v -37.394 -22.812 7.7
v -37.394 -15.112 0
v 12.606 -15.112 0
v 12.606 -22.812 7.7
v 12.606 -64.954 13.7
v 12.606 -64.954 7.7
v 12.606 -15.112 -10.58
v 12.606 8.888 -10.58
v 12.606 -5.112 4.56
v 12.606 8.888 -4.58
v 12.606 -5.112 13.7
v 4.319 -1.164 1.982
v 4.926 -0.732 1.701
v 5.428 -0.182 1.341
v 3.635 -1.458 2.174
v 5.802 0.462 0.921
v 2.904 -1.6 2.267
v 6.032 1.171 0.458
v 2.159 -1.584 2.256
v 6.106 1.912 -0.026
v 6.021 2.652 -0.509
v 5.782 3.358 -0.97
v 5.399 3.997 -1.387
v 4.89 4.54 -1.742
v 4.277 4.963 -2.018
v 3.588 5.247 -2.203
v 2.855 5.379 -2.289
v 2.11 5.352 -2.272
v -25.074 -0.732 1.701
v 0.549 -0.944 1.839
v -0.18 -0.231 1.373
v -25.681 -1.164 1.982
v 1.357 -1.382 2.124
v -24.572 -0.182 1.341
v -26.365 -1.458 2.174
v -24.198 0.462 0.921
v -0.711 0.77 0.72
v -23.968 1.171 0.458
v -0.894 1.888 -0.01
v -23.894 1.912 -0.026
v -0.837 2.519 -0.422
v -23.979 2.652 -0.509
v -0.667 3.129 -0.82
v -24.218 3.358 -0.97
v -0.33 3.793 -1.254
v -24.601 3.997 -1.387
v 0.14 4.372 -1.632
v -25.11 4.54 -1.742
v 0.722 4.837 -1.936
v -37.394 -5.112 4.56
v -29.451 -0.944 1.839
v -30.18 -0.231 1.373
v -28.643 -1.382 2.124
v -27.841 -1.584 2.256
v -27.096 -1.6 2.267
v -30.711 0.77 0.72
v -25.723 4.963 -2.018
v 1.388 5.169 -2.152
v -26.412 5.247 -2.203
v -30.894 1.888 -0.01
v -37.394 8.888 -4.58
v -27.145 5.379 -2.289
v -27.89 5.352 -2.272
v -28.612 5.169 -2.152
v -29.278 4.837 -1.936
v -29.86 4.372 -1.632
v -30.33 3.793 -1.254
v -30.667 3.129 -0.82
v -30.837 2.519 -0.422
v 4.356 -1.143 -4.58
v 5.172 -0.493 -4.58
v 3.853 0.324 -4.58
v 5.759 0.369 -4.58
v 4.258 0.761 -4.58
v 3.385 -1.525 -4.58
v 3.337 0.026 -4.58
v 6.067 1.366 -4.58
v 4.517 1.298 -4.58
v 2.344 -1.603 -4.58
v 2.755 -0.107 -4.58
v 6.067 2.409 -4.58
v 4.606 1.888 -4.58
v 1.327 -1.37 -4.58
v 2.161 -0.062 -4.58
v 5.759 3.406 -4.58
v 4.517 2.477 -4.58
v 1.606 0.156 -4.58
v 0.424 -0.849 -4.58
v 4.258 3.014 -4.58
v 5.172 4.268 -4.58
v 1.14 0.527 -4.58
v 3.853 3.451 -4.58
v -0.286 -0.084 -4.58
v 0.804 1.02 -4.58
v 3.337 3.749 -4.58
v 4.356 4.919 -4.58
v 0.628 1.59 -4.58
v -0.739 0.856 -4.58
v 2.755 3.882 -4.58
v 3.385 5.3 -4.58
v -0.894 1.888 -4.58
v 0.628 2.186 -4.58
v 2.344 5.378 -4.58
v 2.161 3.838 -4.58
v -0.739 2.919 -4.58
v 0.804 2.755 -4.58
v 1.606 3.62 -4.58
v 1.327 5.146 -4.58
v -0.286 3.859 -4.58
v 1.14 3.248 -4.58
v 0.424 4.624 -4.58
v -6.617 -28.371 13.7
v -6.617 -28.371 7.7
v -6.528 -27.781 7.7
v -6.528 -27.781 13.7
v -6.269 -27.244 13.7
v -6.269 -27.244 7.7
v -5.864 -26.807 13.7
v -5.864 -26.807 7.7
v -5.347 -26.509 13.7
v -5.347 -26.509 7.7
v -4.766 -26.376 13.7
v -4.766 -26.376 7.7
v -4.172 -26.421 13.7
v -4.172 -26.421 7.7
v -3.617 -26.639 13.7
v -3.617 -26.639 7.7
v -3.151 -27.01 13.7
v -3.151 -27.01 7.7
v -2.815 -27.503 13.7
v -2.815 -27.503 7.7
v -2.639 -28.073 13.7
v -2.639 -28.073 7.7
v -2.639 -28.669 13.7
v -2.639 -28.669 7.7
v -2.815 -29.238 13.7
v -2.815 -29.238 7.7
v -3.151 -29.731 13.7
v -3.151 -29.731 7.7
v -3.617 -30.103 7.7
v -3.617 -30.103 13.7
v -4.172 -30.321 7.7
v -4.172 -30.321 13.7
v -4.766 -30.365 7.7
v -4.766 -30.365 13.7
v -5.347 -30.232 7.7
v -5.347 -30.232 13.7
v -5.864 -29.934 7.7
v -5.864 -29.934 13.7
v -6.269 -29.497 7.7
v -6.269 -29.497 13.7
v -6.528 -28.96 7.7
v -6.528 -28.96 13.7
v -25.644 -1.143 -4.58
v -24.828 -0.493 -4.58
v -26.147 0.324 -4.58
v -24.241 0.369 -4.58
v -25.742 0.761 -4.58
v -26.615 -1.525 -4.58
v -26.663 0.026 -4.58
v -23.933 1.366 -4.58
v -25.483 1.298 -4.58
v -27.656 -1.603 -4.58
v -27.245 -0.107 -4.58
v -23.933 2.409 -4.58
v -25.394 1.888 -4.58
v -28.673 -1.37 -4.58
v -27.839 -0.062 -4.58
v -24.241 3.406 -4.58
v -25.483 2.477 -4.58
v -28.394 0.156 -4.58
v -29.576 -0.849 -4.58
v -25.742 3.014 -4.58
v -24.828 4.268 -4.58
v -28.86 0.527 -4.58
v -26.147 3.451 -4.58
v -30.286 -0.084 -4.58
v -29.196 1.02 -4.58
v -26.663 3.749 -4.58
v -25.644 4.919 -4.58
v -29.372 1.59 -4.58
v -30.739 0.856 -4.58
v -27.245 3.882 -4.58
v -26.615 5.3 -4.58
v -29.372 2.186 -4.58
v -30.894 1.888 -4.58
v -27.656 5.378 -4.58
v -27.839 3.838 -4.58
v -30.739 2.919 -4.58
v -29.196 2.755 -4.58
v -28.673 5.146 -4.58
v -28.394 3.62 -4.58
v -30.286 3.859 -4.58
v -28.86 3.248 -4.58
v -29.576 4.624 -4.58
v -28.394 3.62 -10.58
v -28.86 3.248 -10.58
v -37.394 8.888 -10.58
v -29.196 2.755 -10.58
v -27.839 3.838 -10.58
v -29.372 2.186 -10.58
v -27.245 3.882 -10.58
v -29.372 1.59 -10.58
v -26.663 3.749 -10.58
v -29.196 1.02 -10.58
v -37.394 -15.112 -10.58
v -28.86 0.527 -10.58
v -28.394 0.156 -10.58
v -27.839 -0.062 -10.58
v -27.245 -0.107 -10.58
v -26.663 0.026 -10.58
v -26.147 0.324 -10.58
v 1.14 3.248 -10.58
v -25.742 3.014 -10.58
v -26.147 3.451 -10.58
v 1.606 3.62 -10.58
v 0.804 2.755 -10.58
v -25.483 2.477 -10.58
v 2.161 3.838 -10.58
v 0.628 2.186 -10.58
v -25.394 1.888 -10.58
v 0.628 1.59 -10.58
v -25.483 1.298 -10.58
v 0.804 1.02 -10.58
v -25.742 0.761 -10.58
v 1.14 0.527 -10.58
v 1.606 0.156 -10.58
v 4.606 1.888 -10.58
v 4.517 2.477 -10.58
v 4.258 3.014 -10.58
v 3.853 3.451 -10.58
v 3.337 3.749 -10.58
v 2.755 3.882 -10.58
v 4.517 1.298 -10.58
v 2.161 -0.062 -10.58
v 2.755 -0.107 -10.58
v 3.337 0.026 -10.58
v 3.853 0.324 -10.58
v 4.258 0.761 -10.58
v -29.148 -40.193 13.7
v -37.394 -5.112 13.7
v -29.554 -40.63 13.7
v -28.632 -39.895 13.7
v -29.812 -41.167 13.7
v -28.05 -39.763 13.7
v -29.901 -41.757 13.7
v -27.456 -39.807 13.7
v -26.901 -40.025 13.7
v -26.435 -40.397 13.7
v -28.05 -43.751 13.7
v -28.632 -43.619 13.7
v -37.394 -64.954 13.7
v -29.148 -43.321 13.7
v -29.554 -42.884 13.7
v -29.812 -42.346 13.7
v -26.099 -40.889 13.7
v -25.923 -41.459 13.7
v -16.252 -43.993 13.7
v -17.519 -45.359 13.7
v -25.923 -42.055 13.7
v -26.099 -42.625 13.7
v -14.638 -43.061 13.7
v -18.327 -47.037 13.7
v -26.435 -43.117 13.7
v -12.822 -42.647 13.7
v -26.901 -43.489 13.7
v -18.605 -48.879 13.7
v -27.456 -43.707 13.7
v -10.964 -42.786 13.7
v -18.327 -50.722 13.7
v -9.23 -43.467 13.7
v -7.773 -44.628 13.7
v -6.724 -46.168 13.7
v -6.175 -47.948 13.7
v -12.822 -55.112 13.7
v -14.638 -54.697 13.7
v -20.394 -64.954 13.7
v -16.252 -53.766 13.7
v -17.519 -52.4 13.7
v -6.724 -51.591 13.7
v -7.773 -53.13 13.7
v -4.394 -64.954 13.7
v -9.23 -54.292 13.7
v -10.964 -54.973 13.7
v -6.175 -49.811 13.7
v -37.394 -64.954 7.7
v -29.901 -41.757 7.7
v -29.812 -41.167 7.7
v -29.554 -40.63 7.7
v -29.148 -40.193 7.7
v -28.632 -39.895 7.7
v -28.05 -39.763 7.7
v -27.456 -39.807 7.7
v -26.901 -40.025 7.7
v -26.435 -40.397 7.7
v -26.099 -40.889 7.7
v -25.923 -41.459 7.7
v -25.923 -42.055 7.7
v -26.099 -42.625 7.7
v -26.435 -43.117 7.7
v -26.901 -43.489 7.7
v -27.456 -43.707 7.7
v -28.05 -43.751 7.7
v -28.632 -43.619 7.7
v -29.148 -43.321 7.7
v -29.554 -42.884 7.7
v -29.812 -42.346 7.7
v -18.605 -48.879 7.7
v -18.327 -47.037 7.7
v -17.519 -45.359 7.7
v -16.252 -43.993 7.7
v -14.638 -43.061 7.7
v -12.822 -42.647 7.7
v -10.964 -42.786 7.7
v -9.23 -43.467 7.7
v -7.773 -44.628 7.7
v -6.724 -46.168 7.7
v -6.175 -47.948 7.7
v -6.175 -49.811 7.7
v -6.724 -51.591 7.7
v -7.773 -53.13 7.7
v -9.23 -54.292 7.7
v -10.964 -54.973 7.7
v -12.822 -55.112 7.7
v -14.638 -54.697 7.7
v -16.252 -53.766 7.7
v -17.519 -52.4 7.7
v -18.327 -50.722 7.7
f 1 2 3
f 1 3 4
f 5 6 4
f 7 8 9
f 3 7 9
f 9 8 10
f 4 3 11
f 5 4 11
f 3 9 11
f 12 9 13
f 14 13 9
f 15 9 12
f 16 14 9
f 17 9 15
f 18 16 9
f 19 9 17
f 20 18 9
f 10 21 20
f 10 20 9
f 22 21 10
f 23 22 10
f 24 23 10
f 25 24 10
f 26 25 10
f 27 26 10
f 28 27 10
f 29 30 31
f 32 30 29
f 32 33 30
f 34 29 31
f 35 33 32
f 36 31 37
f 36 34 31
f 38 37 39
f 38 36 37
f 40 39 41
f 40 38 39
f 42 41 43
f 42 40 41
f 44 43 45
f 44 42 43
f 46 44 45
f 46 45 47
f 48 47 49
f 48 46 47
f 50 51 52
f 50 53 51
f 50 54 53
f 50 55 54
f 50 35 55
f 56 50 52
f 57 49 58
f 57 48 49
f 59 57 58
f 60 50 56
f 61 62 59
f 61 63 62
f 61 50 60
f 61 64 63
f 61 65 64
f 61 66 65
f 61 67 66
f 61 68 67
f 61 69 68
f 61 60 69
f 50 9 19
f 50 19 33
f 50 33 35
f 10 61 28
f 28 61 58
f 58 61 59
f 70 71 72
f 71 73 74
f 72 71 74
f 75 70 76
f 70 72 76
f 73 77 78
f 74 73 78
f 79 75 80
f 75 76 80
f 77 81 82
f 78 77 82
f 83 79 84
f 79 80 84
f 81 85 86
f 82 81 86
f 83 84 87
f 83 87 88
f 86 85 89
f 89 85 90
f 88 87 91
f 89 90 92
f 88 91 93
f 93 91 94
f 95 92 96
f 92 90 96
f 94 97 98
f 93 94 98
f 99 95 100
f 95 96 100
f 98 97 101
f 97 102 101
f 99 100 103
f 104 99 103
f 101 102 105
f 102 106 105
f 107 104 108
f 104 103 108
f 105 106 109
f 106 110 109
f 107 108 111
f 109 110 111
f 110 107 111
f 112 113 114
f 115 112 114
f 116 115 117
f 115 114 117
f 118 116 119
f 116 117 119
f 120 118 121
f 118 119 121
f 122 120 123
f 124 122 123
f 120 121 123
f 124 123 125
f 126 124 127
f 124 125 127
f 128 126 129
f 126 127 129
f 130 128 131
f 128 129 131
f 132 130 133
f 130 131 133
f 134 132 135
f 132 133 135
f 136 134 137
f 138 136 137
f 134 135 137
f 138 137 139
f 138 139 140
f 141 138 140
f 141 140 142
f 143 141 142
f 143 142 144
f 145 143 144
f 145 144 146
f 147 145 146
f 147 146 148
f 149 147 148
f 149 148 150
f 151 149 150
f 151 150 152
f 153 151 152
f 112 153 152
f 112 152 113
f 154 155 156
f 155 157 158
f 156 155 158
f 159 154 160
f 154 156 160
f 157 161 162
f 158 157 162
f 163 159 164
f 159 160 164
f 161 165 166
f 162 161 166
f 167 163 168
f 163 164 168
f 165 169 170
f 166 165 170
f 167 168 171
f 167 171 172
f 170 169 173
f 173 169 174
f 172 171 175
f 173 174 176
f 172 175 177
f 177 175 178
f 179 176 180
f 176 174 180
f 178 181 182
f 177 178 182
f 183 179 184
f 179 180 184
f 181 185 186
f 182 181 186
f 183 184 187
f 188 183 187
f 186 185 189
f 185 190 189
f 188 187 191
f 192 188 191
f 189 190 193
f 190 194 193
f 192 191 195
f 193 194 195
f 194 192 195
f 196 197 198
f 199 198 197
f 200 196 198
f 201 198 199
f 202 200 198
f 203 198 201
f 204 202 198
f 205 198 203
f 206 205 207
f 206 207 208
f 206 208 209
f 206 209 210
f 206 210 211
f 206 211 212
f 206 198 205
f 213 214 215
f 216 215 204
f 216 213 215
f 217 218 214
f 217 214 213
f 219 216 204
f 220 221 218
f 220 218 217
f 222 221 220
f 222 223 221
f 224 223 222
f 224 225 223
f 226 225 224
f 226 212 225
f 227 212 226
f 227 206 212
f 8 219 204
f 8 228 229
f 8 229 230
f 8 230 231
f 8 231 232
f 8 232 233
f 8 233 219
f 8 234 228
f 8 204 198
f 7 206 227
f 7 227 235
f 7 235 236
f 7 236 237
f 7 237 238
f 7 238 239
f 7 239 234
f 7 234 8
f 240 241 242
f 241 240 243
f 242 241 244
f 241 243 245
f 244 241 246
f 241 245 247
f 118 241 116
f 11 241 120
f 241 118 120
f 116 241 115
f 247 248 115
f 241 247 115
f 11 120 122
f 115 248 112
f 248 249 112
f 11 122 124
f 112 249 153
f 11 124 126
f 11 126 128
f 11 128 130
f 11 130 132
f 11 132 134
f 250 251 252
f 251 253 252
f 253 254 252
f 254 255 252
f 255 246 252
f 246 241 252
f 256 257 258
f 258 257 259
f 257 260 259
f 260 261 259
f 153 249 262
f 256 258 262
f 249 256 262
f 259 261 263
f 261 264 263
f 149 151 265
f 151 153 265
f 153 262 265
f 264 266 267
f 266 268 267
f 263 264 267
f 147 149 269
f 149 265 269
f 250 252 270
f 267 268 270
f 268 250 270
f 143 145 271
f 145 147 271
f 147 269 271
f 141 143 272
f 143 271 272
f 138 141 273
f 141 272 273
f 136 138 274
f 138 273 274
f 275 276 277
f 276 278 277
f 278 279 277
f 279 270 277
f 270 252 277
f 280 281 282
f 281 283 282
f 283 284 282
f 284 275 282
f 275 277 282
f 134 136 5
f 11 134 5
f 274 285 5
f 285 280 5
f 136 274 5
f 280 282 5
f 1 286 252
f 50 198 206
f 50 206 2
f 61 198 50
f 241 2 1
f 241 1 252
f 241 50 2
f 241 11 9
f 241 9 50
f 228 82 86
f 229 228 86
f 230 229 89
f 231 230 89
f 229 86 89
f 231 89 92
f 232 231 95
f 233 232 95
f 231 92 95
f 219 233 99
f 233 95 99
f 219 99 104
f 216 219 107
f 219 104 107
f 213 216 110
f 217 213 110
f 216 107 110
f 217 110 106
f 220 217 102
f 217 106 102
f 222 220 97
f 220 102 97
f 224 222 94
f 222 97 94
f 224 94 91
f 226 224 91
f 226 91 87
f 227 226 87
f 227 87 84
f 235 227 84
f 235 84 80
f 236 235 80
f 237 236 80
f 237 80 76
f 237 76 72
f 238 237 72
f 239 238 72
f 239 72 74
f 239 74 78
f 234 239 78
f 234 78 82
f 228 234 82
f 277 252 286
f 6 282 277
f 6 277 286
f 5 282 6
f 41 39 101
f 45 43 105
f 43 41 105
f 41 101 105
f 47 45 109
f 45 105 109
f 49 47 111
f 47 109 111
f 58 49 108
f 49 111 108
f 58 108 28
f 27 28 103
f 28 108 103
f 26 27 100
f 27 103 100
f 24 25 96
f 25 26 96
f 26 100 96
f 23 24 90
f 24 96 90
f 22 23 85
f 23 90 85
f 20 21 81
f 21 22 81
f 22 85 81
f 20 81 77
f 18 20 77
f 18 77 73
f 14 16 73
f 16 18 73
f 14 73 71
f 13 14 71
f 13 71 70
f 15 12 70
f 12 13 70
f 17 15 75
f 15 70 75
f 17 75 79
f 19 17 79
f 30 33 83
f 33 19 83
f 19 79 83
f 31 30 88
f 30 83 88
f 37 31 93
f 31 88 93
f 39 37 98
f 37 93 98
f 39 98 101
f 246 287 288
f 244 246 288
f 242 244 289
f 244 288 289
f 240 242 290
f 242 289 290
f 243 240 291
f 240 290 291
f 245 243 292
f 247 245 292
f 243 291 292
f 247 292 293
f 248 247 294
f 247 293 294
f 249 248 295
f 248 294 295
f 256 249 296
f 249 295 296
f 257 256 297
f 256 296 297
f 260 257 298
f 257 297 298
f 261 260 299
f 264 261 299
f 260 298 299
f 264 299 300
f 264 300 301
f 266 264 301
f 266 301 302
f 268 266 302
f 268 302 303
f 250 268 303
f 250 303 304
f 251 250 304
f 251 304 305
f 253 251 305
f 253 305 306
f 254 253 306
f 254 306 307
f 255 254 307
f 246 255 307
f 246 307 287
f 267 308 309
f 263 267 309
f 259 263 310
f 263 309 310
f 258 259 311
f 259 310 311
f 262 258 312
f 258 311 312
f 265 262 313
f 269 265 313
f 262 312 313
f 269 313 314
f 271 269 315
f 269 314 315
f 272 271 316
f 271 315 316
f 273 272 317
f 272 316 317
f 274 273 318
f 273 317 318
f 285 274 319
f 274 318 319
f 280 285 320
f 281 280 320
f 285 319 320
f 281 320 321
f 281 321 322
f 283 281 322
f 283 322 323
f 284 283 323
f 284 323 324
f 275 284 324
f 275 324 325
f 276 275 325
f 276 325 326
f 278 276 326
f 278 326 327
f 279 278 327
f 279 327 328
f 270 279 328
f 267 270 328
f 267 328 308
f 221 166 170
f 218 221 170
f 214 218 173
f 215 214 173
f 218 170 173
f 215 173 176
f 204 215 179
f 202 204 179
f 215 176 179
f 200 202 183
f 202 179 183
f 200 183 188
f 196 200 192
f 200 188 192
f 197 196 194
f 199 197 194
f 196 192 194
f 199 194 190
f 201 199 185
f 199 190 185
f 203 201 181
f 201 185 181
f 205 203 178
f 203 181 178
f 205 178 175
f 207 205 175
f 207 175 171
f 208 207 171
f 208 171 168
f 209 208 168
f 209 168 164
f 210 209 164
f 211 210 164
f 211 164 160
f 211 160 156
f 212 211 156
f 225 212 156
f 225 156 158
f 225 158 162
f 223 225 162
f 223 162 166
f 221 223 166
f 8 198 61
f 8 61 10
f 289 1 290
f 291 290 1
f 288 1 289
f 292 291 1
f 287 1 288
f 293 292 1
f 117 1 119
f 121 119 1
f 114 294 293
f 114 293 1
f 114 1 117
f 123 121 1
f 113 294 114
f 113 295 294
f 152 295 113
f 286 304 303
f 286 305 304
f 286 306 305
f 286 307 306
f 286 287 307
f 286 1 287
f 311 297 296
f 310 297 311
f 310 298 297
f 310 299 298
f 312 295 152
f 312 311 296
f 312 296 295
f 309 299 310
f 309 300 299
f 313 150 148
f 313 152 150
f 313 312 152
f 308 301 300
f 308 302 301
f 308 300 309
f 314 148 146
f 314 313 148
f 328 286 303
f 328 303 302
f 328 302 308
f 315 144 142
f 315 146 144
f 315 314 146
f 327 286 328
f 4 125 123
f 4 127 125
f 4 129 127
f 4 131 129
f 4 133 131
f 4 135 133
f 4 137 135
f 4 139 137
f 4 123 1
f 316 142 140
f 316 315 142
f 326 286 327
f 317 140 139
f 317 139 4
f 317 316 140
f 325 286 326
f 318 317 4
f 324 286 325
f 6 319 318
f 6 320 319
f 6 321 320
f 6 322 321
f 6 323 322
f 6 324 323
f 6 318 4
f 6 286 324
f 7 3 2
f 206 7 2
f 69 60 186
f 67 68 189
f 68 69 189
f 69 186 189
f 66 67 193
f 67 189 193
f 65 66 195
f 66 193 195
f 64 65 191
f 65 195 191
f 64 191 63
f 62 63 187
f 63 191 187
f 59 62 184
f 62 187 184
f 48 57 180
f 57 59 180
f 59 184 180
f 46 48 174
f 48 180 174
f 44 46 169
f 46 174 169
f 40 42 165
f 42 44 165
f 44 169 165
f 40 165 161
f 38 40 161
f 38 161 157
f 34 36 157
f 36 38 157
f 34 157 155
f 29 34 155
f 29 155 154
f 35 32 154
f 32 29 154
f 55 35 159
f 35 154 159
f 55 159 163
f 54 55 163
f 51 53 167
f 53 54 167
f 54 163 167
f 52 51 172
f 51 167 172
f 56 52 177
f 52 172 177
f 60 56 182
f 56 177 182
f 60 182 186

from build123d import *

# Parameters (mm, degrees)
SKETCH1_W            = 50
SKETCH1_H            = 18
BOSS_EXTRUDE1_DEPTH  = 7
SKETCH2_W            = 50
SKETCH2_H            = 8
BOSS_EXTRUDE2_DEPTH  = 6.7
SKETCH3_W            = 7
SKETCH3_H            = 8
BOSS_EXTRUDE3_DEPTH  = 23
SKETCH4_W            = 7
SKETCH4_H            = 8
BOSS_EXTRUDE4_DEPTH  = 14
SKETCH5_W            = 50
SKETCH5_H            = 10
CUT_EXTRUDE1_DEPTH   = 14
SKETCH6_R            = 2
CUT_EXTRUDE2_DEPTH   = 14
SKETCH7_W            = 50
SKETCH7_H            = 6
BOSS_EXTRUDE5_DEPTH  = 67.91
CUT_EXTRUDE3_DEPTH   = 35
SKETCH9_R            = 2
CUT_EXTRUDE5_DEPTH   = 35
SKETCH13_W           = 14
SKETCH13_H           = 8
CUT_EXTRUDE6_DEPTH   = 10
SKETCH14_W           = 7.7
SKETCH14_H           = 8
CUT_EXTRUDE7_DEPTH   = 120
SKETCH15_W           = 50
SKETCH15_H           = 14
BOSS_EXTRUDE6_DEPTH  = 6.4
SKETCH16_W           = 50
SKETCH16_H           = 14
CUT_EXTRUDE8_DEPTH   = 6
BOSS_EXTRUDE7_DEPTH  = 50
SKETCH18_R           = 2
CUT_EXTRUDE9_DEPTH   = 6.4
SKETCH19_R           = 3.5
CUT_EXTRUDE10_DEPTH  = 6.4
SKETCH20_W           = 12.4
SKETCH20_H           = 26.067854841
CUT_EXTRUDE11_DEPTH  = 70
SKETCH21_W           = 50
SKETCH21_H           = 6
BOSS_EXTRUDE8_DEPTH  = 10
SKETCH22_W           = 50
SKETCH22_H           = 10
BOSS_EXTRUDE9_DEPTH  = 18.28
SKETCH23_W           = 50
SKETCH23_H           = 6
BOSS_EXTRUDE10_DEPTH = 14
SKETCH24_R           = 2
CUT_EXTRUDE12_DEPTH  = 14
BOSS_EXTRUDE11_DEPTH = 50
SKETCH26_R           = 3.5
CUT_EXTRUDE13_DEPTH  = 14
SKETCH27_W           = 16.816450925
SKETCH27_H           = 29.203857669
BOSS_EXTRUDE12_DEPTH = 6
SKETCH28_R           = 6.25
CUT_EXTRUDE14_DEPTH  = 10


with BuildPart() as part:
    # Sketch1 → Boss-Extrude1 (new body)
    with BuildSketch(Plane.XY):
        with Locations((-12.394067797, 1.955508475)):
            Rectangle(SKETCH1_W, SKETCH1_H)
    extrude(amount=BOSS_EXTRUDE1_DEPTH)

    # Sketch2 → Boss-Extrude2 (add)
    with BuildSketch(Plane.XY.offset(7)):
        with Locations((-12.394067797, 6.955508475)):
            Rectangle(SKETCH2_W, SKETCH2_H)
    extrude(amount=BOSS_EXTRUDE2_DEPTH)

    # Sketch3 → Boss-Extrude3 (add)
    with BuildSketch(Plane(origin=(12.605932203, 0, 0), x_dir=(0, 0, -1), z_dir=(1, 0, 0))):
        with Locations((-3.5, 6.955508475)):
            Rectangle(SKETCH3_W, SKETCH3_H)
    extrude(amount=BOSS_EXTRUDE3_DEPTH)

    # Sketch4 → Boss-Extrude4 (add)
    with BuildSketch(Plane.ZY.offset(37.394067797)):
        with Locations((3.5, 6.955508475)):
            Rectangle(SKETCH4_W, SKETCH4_H)
    extrude(amount=BOSS_EXTRUDE4_DEPTH)

    # Sketch5 → Cut-Extrude1 (cut)
    with BuildSketch(Plane.XY.offset(7)):
        with Locations((-12.394067797, -2.044491525)):
            Rectangle(SKETCH5_W, SKETCH5_H)
    extrude(amount=-CUT_EXTRUDE1_DEPTH, mode=Mode.SUBTRACT)

    # Sketch6 → Cut-Extrude2 (cut)
    with BuildSketch(Plane.XY.offset(7)):
        with Locations((19.605932203, 6.955508475)):
            Circle(SKETCH6_R)
        with Locations((28.605932203, 6.955508475)):
            Circle(SKETCH6_R)
    extrude(amount=-CUT_EXTRUDE2_DEPTH, mode=Mode.SUBTRACT)

    # Sketch7 → Boss-Extrude5 (add)
    with BuildSketch(Plane.XZ.offset(-2.955508475)):
        with Locations((-12.394067797, 10.7)):
            Rectangle(SKETCH7_W, SKETCH7_H)
    extrude(amount=BOSS_EXTRUDE5_DEPTH)

    # Sketch8 → Cut-Extrude3 (cut)
    with BuildSketch(Plane.XY.offset(13.7)):
        with BuildLine():
            Line((-4.394067797, -44.33115583), (-4.394067797, -64.954491525))
            ThreePointArc((-4.394067797, -64.954491525), (-12.394067797, -72.954491525), (-20.394067797, -64.954491525))
            Line((-20.394067797, -64.954491525), (-20.394067797, -44.33115583))
            ThreePointArc((-20.394067797, -44.33115583), (-12.394067797, -36.33115583), (-4.394067797, -44.33115583))
        make_face()
    extrude(amount=-CUT_EXTRUDE3_DEPTH, mode=Mode.SUBTRACT)

    # Sketch9 → Cut-Extrude5 (cut)
    with BuildSketch(Plane(origin=(0, 0, 7.7), x_dir=(-1, 0, 0), z_dir=(0, 0, -1))):
        with Locations((27.901028765, -41.756933891)):
            Circle(SKETCH9_R)
        with Locations((4.616687569, -28.370715783)):
            Circle(SKETCH9_R)
    extrude(amount=-CUT_EXTRUDE5_DEPTH, mode=Mode.SUBTRACT)

    # Sketch13 → Cut-Extrude6 (cut)
    with BuildSketch(Plane.XY.offset(7)):
        with Locations((-44.394067797, 6.955508475)):
            Rectangle(SKETCH13_W, SKETCH13_H)
    extrude(amount=-CUT_EXTRUDE6_DEPTH, mode=Mode.SUBTRACT)

    # Sketch14 → Cut-Extrude7 (cut)
    with BuildSketch(Plane.ZY.offset(37.394067797)):
        with Locations((3.85, 6.955508475)):
            Rectangle(SKETCH14_W, SKETCH14_H)
    extrude(amount=-CUT_EXTRUDE7_DEPTH, mode=Mode.SUBTRACT)

    # Sketch15 → Boss-Extrude6 (add)
    with BuildSketch(Plane(origin=(0, 0, 7.7), x_dir=(-1, 0, 0), z_dir=(0, 0, -1))):
        with Locations((12.394067797, 3.955508475)):
            Rectangle(SKETCH15_W, SKETCH15_H)
    extrude(amount=BOSS_EXTRUDE6_DEPTH)

    # Sketch16 → Cut-Extrude8 (cut)
    with BuildSketch(Plane.XY.offset(13.7)):
        with Locations((-12.394067797, 3.955508475)):
            Rectangle(SKETCH16_W, SKETCH16_H)
    extrude(amount=-CUT_EXTRUDE8_DEPTH, mode=Mode.SUBTRACT)


with BuildPart() as cut_extrude8_piece_1:
    # of the separate pieces the step leaves, piece 1, a body of its own (cut_extrude8_pieces)
    add(part.part.solids().sort_by_distance((-37.394067797, -64.954491525, 13.7))[0])



with BuildPart() as cut_extrude8_piece_2:
    # of the separate pieces the step leaves, piece 2, a body of its own (cut_extrude8_pieces)
    add(part.part.solids().sort_by_distance((12.605932203, 10.955508475, 7.7))[0])


with BuildPart() as cut_extrude8_piece_1_1:
    add(cut_extrude8_piece_1.part)

    add(cut_extrude8_piece_2.part)  # Boss-Extrude7 merges Cut-Extrude8 piece 2
    # Sketch17 → Boss-Extrude7 (add)
    with BuildSketch(Plane.ZY.offset(37.394067797)):
        Polygon((7.7, 10.955508475), (13.7, -3.044491525), (7.7, -3.044491525), align=None)
        Polygon((1.3, -3.044491525), (7.7, -14.780389578), (7.7, -3.044491525), align=None)
    extrude(amount=-BOSS_EXTRUDE7_DEPTH)

    # Sketch18 → Cut-Extrude9 (cut)
    with BuildSketch(Plane(origin=(0, 0, 1.3), x_dir=(-1, 0, 0), z_dir=(0, 0, -1))):
        with Locations((-5.605932203, 3.955508475)):
            Circle(SKETCH18_R)
        with Locations((30.394067797, 4.955341008)):
            Circle(SKETCH18_R)
    extrude(amount=-CUT_EXTRUDE9_DEPTH, mode=Mode.SUBTRACT)

    # Sketch19 → Cut-Extrude10 (cut)
    with BuildSketch(Plane(origin=(0, 0, 7.7), x_dir=(-1, 0, 0), z_dir=(0, 0, -1))):
        with Locations((30.394067797, 4.955341008)):
            Circle(SKETCH19_R)
        with Locations((-5.605932203, 3.955508475)):
            Circle(SKETCH19_R)
    extrude(amount=-CUT_EXTRUDE10_DEPTH, mode=Mode.SUBTRACT)

    # Sketch20 → Cut-Extrude11 (cut)
    with BuildSketch(Plane.ZY.offset(37.394067797)):
        with Locations((7.5, -2.078418946)):
            Rectangle(SKETCH20_W, SKETCH20_H)
    extrude(amount=-CUT_EXTRUDE11_DEPTH, mode=Mode.SUBTRACT)

    # Sketch21 → Boss-Extrude8 (add)
    with BuildSketch(Plane(origin=(0, -15.112346366, 0), x_dir=(1, 0, 0), z_dir=(0, 1, 0))):
        with Locations((-12.394067797, -10.7)):
            Rectangle(SKETCH21_W, SKETCH21_H)
    extrude(amount=BOSS_EXTRUDE8_DEPTH)

    # Sketch22 → Boss-Extrude9 (add)
    with BuildSketch(Plane(origin=(0, 0, 7.7), x_dir=(-1, 0, 0), z_dir=(0, 0, -1))):
        with Locations((12.394067797, -10.112346366)):
            Rectangle(SKETCH22_W, SKETCH22_H)
    extrude(amount=BOSS_EXTRUDE9_DEPTH)

    # Sketch23 → Boss-Extrude10 (add)
    with BuildSketch(Plane(origin=(0, -5.112346366, 0), x_dir=(1, 0, 0), z_dir=(0, 1, 0))):
        with Locations((-12.394067797, 7.58)):
            Rectangle(SKETCH23_W, SKETCH23_H)
    extrude(amount=BOSS_EXTRUDE10_DEPTH)

    # Sketch24 → Cut-Extrude12 (cut)
    with BuildSketch(Plane.XY.offset(-4.58)):
        with Locations((2.605932203, 1.887653634)):
            Circle(SKETCH24_R)
        with Locations((-27.394067797, 1.887653634)):
            Circle(SKETCH24_R)
    extrude(amount=-CUT_EXTRUDE12_DEPTH, mode=Mode.SUBTRACT)

    # Sketch25 → Boss-Extrude11 (add)
    with BuildSketch(Plane.ZY.offset(37.394067797)):
        Polygon((7.7, -15.112346366), (0, -15.112346366), (7.7, -22.812346366), align=None)
        Polygon((-4.58, -5.112346366), (4.56, -5.112346366), (-4.58, 8.887653634), align=None)
    extrude(amount=-BOSS_EXTRUDE11_DEPTH)

    # Sketch26 → Cut-Extrude13 (cut)
    with BuildSketch(Plane(origin=(0, 0, -4.58), x_dir=(-1, 0, 0), z_dir=(0, 0, -1))):
        with Locations((27.394067797, 1.887653634)):
            Circle(SKETCH26_R)
        with Locations((-2.605932203, 1.887653634)):
            Circle(SKETCH26_R)
    extrude(amount=-CUT_EXTRUDE13_DEPTH, mode=Mode.SUBTRACT)

    # Sketch27 → Boss-Extrude12 (add)
    with BuildSketch(Plane(origin=(0, 0, 7.7), x_dir=(-1, 0, 0), z_dir=(0, 0, -1))):
        with Locations((11.985842335, -50.352562691)):
            Rectangle(SKETCH27_W, SKETCH27_H)
    extrude(amount=-BOSS_EXTRUDE12_DEPTH)

    # Sketch28 → Cut-Extrude14 (cut)
    with BuildSketch(Plane(origin=(0, 0, 7.7), x_dir=(-1, 0, 0), z_dir=(0, 0, -1))):
        with Locations((12.354948295, -48.879390068)):
            Circle(SKETCH28_R)
    extrude(amount=-CUT_EXTRUDE14_DEPTH, mode=Mode.SUBTRACT)


solid = cut_extrude8_piece_1_1.part
